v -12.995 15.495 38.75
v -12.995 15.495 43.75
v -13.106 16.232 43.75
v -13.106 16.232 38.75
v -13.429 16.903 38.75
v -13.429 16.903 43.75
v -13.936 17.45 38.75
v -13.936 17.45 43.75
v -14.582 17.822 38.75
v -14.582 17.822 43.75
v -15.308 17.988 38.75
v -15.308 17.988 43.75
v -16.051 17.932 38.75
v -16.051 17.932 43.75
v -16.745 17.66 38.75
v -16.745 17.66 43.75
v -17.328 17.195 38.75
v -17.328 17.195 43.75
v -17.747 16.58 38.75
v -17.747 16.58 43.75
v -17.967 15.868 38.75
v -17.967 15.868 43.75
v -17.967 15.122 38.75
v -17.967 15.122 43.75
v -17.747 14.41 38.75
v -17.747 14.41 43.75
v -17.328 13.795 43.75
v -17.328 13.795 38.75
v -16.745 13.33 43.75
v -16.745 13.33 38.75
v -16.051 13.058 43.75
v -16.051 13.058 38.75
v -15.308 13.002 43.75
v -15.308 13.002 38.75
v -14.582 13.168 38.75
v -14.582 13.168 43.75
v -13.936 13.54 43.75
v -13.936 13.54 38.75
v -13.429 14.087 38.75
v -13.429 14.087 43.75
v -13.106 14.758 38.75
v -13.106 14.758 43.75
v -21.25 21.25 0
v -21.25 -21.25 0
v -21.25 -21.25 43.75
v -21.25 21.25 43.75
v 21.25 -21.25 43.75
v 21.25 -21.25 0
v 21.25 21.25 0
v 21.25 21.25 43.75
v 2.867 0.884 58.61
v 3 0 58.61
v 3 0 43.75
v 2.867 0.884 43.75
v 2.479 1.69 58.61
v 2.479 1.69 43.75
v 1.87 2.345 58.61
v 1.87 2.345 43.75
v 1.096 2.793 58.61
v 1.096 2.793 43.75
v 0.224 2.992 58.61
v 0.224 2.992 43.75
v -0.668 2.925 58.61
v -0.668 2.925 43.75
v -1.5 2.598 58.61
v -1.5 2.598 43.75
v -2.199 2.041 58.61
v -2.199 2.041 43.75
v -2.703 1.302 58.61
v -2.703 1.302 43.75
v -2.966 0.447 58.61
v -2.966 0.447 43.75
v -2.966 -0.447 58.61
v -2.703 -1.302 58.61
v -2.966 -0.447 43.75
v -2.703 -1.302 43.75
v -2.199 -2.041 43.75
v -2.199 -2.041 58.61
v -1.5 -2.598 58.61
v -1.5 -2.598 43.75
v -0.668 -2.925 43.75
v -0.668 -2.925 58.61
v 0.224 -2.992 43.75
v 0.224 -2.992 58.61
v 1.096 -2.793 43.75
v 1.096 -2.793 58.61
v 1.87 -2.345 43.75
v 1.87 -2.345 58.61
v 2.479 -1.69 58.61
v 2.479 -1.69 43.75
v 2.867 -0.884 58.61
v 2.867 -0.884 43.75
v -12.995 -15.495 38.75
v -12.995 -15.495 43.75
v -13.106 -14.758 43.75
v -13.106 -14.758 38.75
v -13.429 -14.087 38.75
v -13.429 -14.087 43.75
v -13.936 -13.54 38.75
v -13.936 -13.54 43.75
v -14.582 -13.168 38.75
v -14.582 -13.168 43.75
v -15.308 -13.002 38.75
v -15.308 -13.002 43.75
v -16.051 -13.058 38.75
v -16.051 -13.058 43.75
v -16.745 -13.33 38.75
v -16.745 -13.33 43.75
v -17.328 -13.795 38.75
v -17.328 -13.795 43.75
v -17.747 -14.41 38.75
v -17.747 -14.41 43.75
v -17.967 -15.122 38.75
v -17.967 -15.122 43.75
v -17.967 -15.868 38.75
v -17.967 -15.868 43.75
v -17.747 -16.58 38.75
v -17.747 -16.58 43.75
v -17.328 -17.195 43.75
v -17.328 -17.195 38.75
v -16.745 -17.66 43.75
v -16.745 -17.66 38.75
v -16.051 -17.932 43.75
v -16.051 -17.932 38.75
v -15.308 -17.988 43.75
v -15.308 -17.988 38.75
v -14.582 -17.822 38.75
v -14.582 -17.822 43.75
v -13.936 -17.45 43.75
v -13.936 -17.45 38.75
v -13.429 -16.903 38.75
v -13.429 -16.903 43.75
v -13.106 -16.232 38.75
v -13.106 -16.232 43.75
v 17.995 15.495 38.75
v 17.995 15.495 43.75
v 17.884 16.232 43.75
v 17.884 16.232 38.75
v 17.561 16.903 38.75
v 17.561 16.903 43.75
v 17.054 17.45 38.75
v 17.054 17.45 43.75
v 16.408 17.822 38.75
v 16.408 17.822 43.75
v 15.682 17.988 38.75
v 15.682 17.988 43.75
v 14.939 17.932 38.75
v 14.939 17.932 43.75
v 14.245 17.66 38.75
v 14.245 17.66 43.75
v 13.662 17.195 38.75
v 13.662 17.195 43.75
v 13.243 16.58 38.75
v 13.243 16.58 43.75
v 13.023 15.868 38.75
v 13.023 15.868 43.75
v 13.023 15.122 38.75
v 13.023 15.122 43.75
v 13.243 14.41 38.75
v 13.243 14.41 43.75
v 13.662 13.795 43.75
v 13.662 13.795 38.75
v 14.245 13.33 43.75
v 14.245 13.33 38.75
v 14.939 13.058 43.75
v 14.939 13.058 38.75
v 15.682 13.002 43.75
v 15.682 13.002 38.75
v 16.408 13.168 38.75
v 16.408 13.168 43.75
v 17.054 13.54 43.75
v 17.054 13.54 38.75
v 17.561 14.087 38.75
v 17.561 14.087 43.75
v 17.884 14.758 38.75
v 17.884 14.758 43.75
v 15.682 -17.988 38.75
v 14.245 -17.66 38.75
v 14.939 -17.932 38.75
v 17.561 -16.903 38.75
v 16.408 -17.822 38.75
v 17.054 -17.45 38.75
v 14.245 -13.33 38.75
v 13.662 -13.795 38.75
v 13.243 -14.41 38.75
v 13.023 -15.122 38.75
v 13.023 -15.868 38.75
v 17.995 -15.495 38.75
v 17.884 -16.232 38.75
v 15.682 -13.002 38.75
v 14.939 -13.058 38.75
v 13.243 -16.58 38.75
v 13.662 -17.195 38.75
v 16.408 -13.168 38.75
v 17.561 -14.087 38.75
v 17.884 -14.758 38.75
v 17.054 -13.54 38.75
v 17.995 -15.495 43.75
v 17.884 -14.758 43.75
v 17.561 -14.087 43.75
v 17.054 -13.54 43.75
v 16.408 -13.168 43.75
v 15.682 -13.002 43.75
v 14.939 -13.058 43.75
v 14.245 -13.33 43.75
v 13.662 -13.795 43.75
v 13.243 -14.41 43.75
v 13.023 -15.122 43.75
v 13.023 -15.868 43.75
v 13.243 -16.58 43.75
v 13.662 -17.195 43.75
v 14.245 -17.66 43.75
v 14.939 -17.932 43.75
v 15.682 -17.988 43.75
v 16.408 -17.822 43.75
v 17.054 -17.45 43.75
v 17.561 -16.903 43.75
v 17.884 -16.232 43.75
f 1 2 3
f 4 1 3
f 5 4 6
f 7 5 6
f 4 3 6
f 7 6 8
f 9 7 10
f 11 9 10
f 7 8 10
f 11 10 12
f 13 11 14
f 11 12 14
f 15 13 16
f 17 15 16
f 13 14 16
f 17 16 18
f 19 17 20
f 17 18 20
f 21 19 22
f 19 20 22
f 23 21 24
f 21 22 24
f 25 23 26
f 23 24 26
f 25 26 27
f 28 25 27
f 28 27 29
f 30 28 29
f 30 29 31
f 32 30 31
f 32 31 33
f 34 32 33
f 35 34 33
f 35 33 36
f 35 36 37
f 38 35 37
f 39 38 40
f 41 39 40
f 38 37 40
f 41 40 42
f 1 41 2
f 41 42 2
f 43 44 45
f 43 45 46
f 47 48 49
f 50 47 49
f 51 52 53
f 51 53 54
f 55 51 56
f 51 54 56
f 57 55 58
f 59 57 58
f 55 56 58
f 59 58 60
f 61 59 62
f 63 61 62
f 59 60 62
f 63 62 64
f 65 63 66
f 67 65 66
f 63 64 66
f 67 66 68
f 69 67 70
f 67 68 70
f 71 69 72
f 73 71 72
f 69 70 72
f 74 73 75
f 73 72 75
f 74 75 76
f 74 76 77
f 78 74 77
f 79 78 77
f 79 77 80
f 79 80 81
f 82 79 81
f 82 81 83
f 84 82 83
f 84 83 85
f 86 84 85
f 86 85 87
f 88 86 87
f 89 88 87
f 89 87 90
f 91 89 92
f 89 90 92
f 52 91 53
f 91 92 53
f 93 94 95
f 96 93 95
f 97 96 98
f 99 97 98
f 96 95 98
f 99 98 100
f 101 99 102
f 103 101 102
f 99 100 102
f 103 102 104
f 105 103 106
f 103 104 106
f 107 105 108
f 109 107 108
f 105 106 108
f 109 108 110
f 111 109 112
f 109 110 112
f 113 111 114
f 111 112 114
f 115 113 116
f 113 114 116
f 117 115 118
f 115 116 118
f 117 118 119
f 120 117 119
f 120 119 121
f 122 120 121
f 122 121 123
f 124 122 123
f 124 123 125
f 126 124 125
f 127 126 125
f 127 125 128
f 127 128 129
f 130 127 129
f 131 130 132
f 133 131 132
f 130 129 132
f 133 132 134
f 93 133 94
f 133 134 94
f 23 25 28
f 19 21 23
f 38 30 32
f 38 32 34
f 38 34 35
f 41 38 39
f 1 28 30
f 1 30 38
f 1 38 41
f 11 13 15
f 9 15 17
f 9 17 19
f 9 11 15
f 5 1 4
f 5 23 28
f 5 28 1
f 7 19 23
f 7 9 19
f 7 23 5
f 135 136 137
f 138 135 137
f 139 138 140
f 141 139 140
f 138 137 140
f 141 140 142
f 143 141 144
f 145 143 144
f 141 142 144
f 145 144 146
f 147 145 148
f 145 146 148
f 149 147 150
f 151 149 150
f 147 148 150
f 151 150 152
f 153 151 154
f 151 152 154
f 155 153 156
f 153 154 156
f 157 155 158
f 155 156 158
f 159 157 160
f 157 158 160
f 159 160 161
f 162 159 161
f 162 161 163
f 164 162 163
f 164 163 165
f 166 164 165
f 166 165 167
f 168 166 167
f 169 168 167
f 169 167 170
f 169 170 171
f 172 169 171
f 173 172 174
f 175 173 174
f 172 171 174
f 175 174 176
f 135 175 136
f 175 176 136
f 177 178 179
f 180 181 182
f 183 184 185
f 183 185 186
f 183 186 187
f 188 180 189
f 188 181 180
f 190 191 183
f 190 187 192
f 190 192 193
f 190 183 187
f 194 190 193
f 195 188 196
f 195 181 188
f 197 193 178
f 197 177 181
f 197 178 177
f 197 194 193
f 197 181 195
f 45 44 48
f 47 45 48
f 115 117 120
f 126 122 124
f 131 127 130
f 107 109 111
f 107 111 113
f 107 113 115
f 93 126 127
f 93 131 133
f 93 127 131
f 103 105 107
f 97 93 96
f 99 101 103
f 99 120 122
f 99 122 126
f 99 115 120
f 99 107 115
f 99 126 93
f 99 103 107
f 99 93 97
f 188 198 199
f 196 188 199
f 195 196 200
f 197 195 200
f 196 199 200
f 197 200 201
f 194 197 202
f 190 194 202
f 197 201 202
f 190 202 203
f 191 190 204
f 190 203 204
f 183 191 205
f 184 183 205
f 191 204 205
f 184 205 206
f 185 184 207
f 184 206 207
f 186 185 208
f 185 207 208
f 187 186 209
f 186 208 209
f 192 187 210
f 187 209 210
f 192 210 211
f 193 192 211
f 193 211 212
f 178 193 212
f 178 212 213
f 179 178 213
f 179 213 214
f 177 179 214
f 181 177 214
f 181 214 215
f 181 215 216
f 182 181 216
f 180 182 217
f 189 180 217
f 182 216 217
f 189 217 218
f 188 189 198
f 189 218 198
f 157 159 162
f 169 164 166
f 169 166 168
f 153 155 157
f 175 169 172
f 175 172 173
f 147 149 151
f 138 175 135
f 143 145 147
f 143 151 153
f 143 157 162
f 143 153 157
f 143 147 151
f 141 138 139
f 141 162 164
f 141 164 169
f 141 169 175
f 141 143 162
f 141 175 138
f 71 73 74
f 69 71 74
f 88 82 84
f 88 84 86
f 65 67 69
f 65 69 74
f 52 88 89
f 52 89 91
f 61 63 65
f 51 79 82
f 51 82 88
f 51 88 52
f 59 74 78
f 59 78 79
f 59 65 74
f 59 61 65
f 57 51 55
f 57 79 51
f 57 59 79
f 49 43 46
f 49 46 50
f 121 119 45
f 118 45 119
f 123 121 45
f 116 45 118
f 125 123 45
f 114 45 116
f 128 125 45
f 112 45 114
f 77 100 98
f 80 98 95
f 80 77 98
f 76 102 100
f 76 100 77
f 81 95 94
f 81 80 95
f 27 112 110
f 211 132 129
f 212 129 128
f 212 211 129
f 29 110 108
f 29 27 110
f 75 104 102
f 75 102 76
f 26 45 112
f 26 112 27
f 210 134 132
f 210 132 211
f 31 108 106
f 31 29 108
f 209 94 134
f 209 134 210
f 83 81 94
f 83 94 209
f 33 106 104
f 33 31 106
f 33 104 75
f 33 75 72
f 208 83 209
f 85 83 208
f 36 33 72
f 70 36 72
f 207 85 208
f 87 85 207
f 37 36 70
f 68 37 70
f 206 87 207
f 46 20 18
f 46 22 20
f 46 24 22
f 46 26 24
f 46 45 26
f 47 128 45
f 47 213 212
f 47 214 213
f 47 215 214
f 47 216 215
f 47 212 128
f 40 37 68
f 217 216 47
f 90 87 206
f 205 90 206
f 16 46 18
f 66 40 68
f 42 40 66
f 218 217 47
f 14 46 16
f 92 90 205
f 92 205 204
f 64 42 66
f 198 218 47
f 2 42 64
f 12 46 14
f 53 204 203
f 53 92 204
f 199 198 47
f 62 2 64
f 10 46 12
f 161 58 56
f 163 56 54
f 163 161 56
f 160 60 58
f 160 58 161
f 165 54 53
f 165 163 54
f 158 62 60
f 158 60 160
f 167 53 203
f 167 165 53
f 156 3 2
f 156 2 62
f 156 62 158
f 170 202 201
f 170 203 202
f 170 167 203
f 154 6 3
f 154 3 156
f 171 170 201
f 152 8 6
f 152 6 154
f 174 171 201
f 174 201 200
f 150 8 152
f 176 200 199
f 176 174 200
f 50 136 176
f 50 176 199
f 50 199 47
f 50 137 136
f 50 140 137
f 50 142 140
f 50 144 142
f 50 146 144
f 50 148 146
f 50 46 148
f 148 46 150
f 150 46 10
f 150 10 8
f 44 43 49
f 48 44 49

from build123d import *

# Parameters (mm, degrees)
SKETCH1_W           = 42.5
SKETCH1_H           = 42.5
BOSS_EXTRUDE1_DEPTH = 43.75
SKETCH2_R           = 2.5
CUT_EXTRUDE1_DEPTH  = 5
SKETCH3_R           = 3
BOSS_EXTRUDE2_DEPTH = 14.86


with BuildPart() as part:
    # Sketch1 → Boss-Extrude1 (new body)
    with BuildSketch(Plane.XY):
        Rectangle(SKETCH1_W, SKETCH1_H)
    extrude(amount=BOSS_EXTRUDE1_DEPTH)

    # Sketch2 → Cut-Extrude1 (cut)
    with BuildSketch(Plane.XY.offset(43.75)):
        with Locations((-15.495, 15.495)):
            Circle(SKETCH2_R)
        with Locations((15.495, 15.495)):
            Circle(SKETCH2_R)
        with Locations((15.495, -15.495)):
            Circle(SKETCH2_R)
        with Locations((-15.495, -15.495)):
            Circle(SKETCH2_R)
    extrude(amount=-CUT_EXTRUDE1_DEPTH, mode=Mode.SUBTRACT)

    # Sketch3 → Boss-Extrude2 (add)
    with BuildSketch(Plane.XY.offset(43.75)):
        Circle(SKETCH3_R)
    extrude(amount=BOSS_EXTRUDE2_DEPTH)


solid = part.part
